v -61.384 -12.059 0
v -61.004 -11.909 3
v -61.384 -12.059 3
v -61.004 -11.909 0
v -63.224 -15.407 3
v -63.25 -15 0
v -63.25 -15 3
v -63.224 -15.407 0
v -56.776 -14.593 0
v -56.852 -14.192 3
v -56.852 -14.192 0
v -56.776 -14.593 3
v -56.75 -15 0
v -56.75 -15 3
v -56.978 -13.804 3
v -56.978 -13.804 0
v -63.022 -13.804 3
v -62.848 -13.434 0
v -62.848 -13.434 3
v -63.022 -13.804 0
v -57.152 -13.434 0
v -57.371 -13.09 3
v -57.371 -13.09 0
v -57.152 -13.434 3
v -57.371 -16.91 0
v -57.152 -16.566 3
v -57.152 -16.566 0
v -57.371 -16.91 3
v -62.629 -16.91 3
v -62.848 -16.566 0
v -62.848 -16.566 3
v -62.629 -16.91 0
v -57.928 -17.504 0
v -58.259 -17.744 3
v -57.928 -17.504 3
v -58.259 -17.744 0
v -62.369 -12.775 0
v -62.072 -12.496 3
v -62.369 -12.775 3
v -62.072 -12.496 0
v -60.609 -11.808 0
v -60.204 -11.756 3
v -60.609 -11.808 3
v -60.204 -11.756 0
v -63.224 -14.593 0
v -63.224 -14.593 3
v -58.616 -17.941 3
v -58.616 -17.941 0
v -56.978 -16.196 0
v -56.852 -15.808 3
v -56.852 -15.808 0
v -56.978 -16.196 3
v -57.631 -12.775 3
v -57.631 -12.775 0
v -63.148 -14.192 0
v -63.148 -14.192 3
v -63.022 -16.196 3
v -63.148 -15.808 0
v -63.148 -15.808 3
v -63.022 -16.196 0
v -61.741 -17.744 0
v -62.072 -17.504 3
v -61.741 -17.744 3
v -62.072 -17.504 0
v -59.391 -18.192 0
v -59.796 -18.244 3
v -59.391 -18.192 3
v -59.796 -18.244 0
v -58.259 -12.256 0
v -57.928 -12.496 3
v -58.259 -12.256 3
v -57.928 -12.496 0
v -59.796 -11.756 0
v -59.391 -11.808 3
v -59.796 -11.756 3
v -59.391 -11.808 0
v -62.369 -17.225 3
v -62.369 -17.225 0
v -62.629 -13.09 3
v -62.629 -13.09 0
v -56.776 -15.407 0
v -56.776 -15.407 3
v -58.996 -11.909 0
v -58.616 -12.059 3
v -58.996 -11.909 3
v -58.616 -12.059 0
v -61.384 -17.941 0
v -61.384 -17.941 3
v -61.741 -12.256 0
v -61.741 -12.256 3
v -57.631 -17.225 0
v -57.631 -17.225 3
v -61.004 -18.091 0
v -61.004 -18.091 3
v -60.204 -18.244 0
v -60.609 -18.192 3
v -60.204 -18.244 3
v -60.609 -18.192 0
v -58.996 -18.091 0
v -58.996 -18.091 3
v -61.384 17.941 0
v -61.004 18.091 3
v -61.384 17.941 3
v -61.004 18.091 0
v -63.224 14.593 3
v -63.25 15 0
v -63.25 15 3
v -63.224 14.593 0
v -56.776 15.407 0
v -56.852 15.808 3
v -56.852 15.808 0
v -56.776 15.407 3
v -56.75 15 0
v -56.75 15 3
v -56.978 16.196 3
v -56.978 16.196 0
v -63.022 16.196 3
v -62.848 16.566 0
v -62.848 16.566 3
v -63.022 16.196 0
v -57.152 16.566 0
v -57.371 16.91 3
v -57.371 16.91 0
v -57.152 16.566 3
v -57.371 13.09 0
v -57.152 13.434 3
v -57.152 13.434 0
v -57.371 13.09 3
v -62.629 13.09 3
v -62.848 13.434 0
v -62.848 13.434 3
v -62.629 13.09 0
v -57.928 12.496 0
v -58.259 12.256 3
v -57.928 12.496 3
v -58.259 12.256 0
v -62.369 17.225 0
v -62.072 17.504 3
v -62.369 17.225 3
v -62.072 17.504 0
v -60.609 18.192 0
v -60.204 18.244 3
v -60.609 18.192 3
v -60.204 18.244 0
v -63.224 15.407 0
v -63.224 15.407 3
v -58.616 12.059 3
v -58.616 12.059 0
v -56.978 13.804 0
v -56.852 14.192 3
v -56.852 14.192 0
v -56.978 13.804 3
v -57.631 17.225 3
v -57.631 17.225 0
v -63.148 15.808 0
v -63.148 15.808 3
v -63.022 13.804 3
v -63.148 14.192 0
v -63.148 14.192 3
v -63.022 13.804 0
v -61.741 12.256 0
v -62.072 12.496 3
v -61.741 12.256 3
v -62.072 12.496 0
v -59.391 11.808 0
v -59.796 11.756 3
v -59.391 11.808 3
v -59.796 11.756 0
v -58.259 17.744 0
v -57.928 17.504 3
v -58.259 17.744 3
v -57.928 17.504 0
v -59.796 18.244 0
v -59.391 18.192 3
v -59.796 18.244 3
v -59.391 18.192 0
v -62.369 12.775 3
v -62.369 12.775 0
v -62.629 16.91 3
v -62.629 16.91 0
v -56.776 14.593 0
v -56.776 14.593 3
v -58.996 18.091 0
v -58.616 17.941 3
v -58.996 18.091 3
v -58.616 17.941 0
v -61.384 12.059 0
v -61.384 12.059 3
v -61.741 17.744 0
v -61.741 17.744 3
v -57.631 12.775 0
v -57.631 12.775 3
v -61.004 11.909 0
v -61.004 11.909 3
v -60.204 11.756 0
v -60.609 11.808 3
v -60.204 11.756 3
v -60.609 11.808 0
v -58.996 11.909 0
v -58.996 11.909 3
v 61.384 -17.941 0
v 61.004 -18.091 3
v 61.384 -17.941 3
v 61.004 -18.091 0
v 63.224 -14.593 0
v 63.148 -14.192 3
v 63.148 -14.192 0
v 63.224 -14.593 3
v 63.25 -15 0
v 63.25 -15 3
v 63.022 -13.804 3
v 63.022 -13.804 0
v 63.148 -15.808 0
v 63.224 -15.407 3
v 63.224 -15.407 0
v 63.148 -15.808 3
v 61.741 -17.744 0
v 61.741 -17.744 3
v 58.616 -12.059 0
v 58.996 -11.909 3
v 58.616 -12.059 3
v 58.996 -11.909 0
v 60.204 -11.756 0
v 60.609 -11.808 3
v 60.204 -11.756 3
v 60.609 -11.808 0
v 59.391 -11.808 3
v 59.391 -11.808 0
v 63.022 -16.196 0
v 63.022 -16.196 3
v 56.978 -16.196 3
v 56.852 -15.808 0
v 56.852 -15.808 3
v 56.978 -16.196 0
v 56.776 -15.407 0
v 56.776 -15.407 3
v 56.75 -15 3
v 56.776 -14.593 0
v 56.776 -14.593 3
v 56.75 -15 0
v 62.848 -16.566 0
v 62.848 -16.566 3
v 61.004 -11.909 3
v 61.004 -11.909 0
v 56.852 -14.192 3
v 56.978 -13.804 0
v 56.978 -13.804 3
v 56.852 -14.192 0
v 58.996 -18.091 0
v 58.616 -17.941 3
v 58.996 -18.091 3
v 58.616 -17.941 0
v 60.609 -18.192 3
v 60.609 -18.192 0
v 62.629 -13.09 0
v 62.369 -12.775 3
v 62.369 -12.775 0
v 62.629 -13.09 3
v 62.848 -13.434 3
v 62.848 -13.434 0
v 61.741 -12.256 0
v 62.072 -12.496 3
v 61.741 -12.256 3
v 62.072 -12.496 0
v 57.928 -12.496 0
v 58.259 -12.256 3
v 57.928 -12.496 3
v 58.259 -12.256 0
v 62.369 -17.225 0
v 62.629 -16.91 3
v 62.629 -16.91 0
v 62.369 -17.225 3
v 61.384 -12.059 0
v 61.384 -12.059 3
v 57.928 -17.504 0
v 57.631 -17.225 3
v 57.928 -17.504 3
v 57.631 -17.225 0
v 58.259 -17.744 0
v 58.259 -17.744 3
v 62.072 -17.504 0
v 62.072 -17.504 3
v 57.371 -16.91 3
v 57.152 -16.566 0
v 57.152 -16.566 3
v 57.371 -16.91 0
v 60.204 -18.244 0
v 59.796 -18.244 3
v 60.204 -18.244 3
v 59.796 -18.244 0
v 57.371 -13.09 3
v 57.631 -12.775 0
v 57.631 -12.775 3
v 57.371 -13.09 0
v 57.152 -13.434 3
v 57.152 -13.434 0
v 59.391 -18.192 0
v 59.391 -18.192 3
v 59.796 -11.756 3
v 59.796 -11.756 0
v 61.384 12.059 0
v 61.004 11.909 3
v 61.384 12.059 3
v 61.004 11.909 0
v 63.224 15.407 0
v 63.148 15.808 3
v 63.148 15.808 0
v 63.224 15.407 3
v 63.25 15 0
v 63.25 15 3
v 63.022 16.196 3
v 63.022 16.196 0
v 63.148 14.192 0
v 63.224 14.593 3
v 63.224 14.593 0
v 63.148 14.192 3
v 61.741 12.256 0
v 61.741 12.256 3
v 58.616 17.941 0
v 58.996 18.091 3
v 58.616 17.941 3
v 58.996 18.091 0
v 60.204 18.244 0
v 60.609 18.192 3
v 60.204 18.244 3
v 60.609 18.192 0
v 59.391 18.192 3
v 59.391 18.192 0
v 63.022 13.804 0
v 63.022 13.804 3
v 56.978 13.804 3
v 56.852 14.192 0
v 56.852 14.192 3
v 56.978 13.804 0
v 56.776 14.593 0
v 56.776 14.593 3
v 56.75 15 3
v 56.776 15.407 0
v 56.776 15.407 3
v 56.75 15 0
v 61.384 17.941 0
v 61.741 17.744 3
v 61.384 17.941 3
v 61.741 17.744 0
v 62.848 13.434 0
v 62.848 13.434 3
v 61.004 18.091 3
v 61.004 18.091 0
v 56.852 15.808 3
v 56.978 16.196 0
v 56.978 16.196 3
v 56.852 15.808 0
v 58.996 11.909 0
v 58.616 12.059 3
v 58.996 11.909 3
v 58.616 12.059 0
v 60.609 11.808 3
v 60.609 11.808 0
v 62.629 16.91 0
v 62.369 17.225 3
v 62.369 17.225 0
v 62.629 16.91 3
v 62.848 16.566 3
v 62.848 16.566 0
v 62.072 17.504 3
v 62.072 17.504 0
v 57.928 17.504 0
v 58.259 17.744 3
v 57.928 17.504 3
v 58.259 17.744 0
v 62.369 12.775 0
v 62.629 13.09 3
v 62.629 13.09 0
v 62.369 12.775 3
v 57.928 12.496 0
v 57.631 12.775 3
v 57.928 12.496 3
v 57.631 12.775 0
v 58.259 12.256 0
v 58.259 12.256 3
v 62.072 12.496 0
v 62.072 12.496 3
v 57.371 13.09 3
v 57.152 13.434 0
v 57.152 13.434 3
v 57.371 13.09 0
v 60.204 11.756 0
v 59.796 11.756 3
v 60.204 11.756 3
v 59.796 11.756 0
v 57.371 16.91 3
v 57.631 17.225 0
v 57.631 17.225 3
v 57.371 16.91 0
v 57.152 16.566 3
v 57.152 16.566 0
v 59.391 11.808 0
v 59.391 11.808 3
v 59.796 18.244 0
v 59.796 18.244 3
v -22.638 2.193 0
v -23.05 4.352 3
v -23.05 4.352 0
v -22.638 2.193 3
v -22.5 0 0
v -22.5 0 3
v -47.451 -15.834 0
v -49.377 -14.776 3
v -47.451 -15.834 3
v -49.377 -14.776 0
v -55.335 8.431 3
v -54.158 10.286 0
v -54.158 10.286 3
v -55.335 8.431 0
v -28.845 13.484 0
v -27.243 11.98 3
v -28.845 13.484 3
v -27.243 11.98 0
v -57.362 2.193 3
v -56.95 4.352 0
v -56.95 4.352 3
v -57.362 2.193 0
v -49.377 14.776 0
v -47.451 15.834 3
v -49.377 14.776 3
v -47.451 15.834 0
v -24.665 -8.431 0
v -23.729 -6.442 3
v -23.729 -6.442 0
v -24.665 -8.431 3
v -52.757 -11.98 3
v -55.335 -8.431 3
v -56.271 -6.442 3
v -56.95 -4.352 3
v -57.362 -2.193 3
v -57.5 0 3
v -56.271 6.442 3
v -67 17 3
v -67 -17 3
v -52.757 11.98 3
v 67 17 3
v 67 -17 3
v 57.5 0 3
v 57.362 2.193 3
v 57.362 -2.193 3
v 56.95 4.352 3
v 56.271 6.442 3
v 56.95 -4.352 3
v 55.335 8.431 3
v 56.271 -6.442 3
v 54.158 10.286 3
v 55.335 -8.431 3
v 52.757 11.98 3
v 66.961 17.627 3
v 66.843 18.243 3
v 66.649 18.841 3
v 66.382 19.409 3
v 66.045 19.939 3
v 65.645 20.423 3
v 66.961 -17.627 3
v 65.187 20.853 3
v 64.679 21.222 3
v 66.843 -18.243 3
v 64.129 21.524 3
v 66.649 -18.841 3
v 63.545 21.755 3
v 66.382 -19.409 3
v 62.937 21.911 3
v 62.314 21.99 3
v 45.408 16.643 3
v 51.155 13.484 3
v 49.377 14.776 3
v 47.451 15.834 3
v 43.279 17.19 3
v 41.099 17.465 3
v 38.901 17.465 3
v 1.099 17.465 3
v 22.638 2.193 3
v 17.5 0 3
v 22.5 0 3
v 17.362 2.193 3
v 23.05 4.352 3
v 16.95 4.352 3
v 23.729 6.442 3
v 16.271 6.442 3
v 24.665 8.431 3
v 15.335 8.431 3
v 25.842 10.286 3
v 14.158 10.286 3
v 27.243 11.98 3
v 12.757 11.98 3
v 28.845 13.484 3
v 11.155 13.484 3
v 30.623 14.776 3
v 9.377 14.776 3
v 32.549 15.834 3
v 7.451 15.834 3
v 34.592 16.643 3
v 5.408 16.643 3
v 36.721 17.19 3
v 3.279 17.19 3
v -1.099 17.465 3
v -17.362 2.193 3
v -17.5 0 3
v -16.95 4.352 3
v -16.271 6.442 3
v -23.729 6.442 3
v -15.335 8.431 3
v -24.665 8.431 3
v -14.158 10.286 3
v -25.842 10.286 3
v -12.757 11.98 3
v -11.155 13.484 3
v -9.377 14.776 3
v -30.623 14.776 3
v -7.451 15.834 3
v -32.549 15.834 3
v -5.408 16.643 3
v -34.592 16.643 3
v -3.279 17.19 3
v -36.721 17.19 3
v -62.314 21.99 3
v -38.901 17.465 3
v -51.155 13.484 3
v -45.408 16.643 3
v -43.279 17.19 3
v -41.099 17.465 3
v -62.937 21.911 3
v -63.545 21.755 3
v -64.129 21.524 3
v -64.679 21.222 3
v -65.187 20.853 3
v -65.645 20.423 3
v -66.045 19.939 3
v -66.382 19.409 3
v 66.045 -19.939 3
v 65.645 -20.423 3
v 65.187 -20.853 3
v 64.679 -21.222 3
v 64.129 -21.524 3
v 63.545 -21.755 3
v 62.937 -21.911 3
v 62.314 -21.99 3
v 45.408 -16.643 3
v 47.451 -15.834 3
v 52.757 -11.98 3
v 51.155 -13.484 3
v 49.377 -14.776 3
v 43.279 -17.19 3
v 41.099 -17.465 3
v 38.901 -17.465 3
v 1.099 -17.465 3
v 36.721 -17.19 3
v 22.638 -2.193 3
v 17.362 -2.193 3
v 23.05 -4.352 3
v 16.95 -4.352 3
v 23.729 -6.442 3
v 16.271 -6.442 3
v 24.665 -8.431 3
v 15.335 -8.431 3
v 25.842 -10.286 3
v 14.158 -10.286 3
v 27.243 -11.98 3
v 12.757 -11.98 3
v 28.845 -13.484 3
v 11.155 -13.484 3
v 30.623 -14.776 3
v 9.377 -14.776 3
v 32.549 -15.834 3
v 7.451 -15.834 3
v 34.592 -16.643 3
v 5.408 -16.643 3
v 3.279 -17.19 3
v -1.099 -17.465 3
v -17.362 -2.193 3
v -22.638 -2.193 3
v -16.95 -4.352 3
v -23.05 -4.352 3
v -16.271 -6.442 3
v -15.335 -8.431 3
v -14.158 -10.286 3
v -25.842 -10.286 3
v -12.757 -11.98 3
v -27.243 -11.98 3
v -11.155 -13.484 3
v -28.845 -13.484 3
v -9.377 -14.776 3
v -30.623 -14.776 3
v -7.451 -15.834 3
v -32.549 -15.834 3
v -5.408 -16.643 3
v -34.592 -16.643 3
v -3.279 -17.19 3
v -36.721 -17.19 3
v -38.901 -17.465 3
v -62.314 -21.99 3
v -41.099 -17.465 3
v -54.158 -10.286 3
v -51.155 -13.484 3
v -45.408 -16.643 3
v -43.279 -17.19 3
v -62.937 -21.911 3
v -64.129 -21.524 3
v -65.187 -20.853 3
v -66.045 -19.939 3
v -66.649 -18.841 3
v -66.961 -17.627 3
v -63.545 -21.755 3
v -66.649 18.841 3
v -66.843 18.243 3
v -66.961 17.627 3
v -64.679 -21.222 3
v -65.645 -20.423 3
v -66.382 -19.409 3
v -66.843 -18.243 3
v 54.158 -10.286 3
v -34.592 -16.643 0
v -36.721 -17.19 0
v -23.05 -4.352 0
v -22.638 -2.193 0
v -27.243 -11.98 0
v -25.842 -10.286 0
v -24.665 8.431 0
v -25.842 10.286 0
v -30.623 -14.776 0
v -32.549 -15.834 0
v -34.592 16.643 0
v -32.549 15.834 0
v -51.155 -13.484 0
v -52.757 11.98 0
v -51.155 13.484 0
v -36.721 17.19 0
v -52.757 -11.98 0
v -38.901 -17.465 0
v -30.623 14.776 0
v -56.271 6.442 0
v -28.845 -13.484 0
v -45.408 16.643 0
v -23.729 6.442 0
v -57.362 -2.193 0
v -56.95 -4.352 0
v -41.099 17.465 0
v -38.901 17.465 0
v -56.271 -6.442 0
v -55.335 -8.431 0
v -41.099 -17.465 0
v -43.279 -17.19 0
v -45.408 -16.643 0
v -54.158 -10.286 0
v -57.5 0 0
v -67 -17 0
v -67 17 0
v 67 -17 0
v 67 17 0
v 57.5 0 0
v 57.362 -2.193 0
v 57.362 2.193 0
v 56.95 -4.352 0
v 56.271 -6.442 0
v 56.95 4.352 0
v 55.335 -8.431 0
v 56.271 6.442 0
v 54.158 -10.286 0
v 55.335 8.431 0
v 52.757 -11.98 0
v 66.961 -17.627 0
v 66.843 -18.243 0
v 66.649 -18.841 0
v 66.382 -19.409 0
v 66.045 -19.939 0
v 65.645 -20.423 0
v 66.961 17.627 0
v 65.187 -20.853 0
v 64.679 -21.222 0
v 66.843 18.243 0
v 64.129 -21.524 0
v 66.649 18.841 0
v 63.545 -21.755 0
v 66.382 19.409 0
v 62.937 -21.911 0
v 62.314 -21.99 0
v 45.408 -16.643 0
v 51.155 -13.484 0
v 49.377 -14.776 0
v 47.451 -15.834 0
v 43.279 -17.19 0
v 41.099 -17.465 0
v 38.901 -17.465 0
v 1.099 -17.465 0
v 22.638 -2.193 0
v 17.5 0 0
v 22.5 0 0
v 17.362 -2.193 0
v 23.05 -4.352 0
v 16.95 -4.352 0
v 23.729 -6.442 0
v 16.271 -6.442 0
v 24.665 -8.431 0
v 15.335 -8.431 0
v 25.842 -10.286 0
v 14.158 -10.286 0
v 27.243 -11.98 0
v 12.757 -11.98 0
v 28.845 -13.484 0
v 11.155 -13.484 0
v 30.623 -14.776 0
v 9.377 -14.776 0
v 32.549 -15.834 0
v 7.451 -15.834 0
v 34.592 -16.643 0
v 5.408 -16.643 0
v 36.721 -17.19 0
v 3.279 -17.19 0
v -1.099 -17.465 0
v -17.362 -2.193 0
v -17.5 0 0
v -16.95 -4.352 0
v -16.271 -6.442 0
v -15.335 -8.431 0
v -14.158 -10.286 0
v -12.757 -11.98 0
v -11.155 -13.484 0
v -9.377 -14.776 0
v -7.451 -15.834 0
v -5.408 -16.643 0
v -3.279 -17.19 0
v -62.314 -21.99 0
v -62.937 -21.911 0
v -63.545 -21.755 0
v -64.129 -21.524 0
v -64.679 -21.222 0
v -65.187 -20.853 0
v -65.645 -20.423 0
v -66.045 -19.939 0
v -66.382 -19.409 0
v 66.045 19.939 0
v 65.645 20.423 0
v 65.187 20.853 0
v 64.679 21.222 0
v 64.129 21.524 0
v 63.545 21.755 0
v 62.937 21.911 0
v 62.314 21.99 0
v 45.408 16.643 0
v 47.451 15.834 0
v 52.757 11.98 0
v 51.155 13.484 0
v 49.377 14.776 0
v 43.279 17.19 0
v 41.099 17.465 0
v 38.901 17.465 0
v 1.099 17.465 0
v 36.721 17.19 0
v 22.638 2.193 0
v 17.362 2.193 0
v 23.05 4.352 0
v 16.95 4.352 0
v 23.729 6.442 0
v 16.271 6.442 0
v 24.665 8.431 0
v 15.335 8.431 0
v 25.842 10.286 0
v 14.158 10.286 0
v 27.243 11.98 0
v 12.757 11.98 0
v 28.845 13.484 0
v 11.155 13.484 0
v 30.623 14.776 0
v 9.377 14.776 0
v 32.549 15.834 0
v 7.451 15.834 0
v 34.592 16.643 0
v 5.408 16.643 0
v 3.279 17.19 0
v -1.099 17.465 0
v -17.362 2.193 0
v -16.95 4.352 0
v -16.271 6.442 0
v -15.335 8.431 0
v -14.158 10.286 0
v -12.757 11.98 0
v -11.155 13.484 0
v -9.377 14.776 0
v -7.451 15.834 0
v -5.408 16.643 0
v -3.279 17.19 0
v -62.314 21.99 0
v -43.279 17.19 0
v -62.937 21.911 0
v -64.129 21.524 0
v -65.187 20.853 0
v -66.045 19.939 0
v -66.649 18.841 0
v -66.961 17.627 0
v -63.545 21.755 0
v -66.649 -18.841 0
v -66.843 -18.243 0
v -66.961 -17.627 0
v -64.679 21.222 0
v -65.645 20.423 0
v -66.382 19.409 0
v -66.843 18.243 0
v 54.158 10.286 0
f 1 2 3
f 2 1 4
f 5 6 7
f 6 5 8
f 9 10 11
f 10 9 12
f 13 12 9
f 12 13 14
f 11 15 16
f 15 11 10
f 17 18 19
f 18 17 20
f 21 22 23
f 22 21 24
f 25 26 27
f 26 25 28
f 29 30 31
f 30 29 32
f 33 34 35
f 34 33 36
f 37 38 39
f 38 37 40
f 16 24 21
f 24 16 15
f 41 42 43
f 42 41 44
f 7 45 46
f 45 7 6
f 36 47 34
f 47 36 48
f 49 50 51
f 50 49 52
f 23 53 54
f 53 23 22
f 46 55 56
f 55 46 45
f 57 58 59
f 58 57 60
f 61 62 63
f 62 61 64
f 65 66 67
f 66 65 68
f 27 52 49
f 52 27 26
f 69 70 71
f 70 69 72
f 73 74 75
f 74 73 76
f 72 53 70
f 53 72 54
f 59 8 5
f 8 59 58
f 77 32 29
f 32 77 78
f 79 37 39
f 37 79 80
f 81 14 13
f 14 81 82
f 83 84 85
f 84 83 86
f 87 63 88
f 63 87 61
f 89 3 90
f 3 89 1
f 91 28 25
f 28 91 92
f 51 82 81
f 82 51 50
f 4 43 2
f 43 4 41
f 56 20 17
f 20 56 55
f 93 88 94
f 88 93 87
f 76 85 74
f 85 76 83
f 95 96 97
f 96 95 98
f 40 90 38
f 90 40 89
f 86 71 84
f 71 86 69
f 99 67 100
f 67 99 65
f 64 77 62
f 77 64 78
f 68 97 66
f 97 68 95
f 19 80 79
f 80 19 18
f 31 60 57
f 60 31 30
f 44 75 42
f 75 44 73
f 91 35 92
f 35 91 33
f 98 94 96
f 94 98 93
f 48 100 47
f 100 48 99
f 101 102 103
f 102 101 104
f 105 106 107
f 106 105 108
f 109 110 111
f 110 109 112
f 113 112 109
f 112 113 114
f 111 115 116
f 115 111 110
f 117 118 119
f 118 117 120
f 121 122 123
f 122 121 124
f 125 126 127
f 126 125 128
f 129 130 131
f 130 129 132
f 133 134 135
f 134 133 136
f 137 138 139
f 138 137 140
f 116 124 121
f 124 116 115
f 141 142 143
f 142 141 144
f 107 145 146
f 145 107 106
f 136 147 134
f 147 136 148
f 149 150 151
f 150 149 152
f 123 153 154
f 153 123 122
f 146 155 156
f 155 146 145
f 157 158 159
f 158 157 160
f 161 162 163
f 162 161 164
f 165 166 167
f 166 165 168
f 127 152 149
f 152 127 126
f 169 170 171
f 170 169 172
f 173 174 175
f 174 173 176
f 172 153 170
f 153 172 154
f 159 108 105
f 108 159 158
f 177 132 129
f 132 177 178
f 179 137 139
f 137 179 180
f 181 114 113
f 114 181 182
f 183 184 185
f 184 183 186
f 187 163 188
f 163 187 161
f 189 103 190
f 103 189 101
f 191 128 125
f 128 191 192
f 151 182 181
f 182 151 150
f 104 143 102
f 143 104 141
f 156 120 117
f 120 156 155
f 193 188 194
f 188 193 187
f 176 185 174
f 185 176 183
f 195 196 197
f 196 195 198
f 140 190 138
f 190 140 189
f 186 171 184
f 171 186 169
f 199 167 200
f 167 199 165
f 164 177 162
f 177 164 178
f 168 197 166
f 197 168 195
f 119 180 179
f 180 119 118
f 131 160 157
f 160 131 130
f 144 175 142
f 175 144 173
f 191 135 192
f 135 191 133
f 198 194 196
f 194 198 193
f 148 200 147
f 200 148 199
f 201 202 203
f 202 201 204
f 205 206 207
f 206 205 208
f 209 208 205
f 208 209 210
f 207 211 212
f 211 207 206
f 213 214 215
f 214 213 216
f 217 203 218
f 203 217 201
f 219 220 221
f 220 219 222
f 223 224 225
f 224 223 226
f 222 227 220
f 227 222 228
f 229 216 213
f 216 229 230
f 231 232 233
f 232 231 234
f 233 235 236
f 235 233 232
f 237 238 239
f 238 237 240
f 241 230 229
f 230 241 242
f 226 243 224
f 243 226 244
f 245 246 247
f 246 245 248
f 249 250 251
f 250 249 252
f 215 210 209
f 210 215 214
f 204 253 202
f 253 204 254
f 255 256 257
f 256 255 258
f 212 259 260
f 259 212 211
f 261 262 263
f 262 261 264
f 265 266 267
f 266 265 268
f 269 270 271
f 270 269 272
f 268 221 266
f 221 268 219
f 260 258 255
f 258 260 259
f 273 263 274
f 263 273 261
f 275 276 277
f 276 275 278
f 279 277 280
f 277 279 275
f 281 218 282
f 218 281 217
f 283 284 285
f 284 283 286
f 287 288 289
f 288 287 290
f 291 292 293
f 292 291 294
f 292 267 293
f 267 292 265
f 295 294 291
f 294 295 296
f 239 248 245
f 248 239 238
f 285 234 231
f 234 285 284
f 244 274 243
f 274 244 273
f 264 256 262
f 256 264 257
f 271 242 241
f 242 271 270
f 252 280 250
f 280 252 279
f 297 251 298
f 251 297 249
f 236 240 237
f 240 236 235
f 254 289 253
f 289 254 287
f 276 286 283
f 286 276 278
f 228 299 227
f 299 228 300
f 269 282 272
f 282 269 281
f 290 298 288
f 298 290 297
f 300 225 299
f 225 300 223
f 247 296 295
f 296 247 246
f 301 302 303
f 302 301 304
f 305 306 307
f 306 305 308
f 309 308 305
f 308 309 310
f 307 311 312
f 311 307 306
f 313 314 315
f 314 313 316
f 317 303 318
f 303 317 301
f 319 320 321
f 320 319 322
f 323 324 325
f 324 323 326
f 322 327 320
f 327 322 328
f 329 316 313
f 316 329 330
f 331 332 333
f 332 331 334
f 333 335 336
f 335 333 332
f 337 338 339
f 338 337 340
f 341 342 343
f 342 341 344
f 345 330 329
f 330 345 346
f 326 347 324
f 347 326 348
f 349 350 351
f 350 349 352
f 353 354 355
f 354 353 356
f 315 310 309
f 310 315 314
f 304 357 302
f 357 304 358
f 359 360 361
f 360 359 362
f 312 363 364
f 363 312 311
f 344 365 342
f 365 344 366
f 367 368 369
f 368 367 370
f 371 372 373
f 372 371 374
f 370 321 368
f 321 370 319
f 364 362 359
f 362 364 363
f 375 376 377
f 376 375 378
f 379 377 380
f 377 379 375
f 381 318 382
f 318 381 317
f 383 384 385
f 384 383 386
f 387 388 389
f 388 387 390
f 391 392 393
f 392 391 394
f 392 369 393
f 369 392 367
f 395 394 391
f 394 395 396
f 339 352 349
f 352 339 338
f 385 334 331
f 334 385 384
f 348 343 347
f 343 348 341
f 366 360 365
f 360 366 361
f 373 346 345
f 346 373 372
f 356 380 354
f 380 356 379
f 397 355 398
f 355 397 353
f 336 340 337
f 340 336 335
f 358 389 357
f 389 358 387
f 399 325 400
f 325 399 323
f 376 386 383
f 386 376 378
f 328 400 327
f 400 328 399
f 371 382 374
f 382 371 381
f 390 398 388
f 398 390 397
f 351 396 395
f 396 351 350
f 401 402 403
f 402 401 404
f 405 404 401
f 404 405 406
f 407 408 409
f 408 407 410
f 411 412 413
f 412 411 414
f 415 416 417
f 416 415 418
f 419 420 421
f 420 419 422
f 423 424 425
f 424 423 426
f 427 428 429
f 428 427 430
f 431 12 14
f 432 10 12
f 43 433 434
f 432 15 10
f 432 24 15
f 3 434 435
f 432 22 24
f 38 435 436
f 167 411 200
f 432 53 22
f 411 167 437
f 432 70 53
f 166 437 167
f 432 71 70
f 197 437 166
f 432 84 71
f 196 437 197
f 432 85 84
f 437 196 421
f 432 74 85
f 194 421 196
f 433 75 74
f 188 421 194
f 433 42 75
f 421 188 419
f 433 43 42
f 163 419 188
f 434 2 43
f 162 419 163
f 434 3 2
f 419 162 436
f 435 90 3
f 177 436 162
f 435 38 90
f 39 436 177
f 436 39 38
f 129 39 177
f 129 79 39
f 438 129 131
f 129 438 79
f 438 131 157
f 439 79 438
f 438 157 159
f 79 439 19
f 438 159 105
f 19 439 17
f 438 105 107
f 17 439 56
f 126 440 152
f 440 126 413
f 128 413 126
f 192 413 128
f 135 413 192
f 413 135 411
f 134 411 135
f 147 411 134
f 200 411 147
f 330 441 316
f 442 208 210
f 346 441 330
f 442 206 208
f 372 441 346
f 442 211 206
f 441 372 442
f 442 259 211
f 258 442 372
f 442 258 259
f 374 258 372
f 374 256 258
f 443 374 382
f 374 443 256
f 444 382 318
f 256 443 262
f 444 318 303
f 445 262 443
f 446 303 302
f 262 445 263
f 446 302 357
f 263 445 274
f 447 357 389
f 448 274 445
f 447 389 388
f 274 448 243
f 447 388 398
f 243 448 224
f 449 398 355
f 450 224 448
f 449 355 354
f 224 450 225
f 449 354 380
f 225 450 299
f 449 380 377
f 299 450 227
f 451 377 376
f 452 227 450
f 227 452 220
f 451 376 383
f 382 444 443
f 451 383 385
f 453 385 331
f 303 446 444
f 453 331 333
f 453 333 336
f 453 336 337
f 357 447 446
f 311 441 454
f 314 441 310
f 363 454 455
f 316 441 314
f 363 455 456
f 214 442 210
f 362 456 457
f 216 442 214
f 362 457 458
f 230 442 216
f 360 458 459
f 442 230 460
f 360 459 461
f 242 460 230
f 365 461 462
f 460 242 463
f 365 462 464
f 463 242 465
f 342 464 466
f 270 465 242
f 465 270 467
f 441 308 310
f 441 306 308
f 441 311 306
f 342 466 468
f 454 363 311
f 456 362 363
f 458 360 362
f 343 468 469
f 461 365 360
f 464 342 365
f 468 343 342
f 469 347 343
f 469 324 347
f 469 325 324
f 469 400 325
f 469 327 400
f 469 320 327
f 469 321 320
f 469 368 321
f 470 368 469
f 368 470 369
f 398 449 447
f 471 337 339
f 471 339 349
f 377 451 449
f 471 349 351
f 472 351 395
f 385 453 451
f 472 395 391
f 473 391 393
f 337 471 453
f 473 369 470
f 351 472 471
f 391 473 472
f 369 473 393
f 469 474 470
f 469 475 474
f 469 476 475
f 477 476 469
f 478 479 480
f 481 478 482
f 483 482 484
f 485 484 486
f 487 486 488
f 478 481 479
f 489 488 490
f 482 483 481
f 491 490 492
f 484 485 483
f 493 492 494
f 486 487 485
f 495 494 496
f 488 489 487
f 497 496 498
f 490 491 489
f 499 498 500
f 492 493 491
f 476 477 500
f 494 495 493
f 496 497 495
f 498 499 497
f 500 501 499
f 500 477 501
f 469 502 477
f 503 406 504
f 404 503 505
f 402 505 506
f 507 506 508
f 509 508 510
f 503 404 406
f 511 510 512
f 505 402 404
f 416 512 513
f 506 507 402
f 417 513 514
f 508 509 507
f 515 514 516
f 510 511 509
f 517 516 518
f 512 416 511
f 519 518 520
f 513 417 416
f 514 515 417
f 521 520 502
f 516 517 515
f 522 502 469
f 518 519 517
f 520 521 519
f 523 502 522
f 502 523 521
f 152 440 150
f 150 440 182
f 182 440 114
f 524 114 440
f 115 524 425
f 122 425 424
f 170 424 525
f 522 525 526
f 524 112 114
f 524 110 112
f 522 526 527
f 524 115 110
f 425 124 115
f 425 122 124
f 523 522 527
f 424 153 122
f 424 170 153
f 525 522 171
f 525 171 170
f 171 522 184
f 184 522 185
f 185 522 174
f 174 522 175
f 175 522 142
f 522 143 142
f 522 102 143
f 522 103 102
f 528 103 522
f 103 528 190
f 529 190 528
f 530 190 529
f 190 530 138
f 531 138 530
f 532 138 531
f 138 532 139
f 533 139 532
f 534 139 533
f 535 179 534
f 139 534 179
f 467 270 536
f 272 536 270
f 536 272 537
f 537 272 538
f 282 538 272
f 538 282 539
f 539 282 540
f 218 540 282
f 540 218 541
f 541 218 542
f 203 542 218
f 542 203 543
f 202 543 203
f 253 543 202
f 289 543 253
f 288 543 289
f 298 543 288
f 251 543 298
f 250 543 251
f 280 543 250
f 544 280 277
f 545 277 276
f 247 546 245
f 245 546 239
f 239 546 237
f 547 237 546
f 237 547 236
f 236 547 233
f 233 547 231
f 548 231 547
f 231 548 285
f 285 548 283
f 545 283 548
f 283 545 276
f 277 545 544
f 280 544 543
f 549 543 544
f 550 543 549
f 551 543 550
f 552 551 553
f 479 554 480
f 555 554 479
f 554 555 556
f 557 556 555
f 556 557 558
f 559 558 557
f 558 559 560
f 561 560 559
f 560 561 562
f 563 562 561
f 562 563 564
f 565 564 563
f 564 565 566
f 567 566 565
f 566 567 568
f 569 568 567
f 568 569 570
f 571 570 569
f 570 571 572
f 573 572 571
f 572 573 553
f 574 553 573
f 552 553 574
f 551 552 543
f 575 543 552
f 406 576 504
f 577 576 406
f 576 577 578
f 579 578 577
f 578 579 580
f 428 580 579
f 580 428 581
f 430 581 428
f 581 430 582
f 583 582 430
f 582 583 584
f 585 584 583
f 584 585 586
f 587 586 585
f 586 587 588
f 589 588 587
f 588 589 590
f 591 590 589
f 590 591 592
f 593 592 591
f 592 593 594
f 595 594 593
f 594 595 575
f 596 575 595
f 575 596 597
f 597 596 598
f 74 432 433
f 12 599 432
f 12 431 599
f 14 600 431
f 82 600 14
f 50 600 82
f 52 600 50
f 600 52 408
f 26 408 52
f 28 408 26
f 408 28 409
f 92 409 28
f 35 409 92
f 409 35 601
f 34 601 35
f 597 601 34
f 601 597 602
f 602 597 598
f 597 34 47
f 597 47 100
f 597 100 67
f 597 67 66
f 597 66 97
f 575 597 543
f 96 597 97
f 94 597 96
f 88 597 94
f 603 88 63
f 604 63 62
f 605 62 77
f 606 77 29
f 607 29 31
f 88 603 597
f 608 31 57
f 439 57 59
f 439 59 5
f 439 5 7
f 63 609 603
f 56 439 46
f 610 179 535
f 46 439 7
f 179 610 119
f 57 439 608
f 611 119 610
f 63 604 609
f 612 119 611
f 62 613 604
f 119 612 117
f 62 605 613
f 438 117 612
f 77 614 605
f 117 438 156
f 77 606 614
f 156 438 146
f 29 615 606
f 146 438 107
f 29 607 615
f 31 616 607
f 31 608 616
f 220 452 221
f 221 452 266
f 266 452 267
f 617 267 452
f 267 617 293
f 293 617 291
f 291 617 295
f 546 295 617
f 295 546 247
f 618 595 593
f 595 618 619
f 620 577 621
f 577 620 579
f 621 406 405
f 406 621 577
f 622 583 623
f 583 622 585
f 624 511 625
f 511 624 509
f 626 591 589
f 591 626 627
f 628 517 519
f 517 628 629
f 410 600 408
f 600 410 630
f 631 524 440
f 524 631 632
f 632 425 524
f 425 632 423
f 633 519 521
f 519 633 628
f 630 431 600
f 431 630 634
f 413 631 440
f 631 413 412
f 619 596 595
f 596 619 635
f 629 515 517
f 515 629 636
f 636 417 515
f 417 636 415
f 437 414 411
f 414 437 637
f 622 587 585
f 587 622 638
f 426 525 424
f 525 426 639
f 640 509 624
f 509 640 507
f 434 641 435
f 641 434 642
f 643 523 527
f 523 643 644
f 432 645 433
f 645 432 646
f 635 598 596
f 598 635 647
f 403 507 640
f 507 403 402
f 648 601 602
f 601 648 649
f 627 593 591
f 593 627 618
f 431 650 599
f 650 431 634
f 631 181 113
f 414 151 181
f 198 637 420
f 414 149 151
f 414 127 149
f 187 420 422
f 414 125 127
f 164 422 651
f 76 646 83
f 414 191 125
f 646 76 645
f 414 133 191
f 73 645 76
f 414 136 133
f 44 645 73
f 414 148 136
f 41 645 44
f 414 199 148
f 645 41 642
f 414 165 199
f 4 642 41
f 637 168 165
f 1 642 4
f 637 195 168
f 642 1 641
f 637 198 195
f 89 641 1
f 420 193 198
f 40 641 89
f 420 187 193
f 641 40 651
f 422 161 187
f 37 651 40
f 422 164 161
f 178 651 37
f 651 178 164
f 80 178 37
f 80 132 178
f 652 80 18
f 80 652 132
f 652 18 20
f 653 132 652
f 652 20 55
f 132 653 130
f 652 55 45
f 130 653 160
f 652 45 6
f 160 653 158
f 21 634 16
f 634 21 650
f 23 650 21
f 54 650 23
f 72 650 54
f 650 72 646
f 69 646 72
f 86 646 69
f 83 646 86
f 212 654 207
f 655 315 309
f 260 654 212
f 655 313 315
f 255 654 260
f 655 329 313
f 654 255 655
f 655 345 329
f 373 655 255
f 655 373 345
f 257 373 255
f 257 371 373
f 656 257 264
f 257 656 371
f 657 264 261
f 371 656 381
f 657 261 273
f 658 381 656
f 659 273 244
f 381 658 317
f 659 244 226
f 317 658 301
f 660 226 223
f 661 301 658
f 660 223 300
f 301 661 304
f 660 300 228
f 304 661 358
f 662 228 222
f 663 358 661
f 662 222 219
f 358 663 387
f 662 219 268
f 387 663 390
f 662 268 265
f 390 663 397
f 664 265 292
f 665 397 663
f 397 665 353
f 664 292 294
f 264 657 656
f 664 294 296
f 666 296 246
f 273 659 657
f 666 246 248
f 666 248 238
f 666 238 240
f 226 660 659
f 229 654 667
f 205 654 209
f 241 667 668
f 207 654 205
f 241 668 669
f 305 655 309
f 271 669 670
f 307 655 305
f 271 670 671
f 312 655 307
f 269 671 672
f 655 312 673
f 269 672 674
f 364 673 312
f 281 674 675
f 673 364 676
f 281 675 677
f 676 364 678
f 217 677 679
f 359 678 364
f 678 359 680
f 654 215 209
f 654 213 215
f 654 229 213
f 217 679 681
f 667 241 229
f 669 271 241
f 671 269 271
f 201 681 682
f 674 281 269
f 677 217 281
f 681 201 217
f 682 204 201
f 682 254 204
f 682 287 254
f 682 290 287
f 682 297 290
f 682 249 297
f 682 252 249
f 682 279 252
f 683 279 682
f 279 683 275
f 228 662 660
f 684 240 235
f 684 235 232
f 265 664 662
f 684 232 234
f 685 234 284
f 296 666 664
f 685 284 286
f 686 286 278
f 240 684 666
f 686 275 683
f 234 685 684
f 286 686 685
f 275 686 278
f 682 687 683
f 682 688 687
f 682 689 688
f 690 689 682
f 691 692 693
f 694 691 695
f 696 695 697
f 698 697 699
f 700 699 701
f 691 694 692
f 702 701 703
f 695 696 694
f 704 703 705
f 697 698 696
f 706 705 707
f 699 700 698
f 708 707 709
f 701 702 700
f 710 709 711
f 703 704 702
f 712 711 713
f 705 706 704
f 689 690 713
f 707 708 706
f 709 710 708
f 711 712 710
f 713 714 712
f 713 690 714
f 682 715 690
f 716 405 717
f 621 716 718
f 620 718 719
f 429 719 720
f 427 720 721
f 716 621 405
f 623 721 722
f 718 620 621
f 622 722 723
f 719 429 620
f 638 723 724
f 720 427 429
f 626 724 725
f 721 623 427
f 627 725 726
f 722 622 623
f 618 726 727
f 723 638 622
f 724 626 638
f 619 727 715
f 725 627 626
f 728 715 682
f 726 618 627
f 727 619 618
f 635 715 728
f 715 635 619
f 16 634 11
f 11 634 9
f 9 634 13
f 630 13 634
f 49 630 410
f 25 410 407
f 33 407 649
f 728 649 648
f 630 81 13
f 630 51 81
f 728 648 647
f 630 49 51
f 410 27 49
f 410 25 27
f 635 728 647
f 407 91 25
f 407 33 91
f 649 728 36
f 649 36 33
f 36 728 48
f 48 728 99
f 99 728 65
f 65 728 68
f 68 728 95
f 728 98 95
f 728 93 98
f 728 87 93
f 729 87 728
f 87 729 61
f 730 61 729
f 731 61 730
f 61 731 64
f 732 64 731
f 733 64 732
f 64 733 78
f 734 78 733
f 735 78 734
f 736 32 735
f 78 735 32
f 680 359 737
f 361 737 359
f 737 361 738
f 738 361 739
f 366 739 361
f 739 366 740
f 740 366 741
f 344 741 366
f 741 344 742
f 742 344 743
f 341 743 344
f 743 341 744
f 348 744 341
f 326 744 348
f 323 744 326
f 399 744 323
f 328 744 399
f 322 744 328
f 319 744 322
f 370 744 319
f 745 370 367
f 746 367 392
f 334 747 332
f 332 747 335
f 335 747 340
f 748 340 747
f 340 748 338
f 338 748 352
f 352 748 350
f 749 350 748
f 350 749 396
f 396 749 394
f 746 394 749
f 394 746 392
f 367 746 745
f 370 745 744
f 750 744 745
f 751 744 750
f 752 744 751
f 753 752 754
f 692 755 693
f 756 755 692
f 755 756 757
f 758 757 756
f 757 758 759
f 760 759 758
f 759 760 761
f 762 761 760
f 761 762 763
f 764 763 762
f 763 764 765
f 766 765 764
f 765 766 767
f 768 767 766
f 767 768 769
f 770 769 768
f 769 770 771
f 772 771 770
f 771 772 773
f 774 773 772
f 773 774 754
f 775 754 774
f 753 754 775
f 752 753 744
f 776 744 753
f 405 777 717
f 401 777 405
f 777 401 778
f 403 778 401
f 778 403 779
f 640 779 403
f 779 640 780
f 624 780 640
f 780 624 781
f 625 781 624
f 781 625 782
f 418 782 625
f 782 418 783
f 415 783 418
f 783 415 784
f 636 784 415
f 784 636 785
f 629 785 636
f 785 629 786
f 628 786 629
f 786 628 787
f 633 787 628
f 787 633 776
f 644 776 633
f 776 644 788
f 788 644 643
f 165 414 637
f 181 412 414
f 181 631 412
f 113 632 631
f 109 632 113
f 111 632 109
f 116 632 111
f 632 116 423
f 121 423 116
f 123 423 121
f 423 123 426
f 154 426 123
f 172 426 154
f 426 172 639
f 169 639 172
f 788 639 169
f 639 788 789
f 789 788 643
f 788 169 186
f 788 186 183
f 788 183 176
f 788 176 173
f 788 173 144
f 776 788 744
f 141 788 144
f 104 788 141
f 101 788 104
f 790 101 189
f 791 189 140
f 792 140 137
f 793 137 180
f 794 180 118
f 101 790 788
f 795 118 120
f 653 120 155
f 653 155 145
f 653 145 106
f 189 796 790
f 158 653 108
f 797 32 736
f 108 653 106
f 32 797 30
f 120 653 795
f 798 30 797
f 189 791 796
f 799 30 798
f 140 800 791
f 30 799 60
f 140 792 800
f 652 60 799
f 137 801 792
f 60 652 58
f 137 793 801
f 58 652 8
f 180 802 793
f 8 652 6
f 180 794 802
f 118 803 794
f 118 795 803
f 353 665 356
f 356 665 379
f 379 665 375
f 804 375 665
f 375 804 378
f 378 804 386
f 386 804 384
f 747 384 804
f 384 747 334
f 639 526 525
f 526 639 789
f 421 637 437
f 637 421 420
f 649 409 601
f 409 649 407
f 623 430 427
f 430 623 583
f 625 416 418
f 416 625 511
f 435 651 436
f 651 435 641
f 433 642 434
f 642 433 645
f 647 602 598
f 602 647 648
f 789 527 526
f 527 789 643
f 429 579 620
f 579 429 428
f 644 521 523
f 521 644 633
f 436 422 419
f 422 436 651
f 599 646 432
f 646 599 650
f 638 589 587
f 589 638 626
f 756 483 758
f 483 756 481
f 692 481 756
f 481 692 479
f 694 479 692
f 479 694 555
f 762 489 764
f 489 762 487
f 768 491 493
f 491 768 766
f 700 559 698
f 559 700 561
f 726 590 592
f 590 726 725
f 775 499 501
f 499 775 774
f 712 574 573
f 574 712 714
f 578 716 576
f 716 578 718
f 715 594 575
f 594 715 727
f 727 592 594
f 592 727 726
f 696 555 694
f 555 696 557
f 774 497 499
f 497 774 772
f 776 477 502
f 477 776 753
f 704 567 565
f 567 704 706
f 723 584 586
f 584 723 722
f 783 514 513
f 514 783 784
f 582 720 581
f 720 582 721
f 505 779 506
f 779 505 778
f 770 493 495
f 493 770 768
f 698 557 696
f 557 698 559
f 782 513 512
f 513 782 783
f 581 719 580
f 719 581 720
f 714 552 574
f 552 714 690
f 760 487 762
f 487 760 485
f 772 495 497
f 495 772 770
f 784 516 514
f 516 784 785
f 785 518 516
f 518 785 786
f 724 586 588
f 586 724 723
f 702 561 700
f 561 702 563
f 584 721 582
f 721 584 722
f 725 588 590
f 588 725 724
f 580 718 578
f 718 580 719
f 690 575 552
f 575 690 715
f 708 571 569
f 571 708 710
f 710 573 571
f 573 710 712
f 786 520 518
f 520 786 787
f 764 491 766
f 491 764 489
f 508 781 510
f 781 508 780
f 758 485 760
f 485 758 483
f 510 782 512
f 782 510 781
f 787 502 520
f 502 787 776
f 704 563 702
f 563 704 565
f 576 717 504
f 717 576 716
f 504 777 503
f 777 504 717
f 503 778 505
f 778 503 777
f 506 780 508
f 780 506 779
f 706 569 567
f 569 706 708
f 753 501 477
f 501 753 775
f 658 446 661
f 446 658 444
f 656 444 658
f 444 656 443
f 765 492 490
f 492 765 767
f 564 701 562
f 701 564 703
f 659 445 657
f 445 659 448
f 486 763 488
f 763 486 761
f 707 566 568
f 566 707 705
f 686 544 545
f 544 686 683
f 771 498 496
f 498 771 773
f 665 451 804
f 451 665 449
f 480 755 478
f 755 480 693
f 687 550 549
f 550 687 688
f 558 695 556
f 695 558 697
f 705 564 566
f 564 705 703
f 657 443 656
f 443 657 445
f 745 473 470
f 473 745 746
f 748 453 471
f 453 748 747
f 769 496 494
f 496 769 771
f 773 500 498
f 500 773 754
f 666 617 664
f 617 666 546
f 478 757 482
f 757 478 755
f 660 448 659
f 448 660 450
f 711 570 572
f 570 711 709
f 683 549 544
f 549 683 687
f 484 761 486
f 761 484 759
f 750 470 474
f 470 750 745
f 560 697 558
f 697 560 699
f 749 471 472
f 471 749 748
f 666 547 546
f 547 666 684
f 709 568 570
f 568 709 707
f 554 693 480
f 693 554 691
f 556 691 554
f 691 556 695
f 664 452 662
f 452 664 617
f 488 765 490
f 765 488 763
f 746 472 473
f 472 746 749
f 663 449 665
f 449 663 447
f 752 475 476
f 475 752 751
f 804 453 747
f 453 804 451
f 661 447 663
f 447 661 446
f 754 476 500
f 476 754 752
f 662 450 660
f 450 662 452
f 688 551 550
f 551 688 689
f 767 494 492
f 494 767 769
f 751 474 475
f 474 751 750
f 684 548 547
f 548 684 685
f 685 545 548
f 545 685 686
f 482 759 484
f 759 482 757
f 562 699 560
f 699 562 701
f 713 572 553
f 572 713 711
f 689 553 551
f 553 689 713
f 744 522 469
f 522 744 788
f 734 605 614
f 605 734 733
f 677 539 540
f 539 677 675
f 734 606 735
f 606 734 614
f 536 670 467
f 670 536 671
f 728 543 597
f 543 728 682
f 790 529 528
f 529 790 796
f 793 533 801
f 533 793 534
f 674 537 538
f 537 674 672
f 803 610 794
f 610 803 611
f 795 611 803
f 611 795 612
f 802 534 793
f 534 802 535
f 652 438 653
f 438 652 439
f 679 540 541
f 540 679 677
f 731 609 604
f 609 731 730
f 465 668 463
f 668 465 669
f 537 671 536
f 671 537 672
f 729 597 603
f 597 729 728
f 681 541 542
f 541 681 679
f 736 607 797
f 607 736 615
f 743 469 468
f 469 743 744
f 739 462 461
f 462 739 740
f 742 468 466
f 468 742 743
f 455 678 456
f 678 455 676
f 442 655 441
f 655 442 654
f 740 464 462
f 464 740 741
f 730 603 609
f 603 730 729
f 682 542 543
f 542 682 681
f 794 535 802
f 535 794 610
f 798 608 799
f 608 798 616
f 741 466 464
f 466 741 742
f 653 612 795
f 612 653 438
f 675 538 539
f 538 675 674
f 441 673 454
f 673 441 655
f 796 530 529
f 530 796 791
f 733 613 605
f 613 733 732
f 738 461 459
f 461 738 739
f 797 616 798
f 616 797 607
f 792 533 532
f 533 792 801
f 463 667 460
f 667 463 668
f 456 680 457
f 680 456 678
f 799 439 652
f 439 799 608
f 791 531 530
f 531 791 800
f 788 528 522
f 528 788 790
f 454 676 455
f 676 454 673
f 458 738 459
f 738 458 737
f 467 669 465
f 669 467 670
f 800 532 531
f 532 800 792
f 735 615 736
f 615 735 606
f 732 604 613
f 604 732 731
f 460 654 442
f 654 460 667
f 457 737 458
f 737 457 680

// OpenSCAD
$fn = 50;


difference() {
	union() {
		hull() {
			translate(v = [-62.0000000000, 17.0000000000, 0]) {
				cylinder(h = 3, r = 5);
			}
			translate(v = [62.0000000000, 17.0000000000, 0]) {
				cylinder(h = 3, r = 5);
			}
			translate(v = [-62.0000000000, -17.0000000000, 0]) {
				cylinder(h = 3, r = 5);
			}
			translate(v = [62.0000000000, -17.0000000000, 0]) {
				cylinder(h = 3, r = 5);
			}
		}
	}
	union() {
		#translate(v = [-60.0000000000, -15.0000000000, -100.0000000000]) {
			cylinder(h = 200, r = 3.2500000000);
		}
		#translate(v = [-60.0000000000, 15.0000000000, -100.0000000000]) {
			cylinder(h = 200, r = 3.2500000000);
		}
		#translate(v = [60.0000000000, -15.0000000000, -100.0000000000]) {
			cylinder(h = 200, r = 3.2500000000);
		}
		#translate(v = [60.0000000000, 15.0000000000, -100.0000000000]) {
			cylinder(h = 200, r = 3.2500000000);
		}
		#translate(v = [-40.0000000000, 0, 0]) {
			cylinder(h = 3, r = 17.5000000000);
		}
		#cylinder(h = 3, r = 17.5000000000);
		#translate(v = [40.0000000000, 0, 0]) {
			cylinder(h = 3, r = 17.5000000000);
		}
	}
}
